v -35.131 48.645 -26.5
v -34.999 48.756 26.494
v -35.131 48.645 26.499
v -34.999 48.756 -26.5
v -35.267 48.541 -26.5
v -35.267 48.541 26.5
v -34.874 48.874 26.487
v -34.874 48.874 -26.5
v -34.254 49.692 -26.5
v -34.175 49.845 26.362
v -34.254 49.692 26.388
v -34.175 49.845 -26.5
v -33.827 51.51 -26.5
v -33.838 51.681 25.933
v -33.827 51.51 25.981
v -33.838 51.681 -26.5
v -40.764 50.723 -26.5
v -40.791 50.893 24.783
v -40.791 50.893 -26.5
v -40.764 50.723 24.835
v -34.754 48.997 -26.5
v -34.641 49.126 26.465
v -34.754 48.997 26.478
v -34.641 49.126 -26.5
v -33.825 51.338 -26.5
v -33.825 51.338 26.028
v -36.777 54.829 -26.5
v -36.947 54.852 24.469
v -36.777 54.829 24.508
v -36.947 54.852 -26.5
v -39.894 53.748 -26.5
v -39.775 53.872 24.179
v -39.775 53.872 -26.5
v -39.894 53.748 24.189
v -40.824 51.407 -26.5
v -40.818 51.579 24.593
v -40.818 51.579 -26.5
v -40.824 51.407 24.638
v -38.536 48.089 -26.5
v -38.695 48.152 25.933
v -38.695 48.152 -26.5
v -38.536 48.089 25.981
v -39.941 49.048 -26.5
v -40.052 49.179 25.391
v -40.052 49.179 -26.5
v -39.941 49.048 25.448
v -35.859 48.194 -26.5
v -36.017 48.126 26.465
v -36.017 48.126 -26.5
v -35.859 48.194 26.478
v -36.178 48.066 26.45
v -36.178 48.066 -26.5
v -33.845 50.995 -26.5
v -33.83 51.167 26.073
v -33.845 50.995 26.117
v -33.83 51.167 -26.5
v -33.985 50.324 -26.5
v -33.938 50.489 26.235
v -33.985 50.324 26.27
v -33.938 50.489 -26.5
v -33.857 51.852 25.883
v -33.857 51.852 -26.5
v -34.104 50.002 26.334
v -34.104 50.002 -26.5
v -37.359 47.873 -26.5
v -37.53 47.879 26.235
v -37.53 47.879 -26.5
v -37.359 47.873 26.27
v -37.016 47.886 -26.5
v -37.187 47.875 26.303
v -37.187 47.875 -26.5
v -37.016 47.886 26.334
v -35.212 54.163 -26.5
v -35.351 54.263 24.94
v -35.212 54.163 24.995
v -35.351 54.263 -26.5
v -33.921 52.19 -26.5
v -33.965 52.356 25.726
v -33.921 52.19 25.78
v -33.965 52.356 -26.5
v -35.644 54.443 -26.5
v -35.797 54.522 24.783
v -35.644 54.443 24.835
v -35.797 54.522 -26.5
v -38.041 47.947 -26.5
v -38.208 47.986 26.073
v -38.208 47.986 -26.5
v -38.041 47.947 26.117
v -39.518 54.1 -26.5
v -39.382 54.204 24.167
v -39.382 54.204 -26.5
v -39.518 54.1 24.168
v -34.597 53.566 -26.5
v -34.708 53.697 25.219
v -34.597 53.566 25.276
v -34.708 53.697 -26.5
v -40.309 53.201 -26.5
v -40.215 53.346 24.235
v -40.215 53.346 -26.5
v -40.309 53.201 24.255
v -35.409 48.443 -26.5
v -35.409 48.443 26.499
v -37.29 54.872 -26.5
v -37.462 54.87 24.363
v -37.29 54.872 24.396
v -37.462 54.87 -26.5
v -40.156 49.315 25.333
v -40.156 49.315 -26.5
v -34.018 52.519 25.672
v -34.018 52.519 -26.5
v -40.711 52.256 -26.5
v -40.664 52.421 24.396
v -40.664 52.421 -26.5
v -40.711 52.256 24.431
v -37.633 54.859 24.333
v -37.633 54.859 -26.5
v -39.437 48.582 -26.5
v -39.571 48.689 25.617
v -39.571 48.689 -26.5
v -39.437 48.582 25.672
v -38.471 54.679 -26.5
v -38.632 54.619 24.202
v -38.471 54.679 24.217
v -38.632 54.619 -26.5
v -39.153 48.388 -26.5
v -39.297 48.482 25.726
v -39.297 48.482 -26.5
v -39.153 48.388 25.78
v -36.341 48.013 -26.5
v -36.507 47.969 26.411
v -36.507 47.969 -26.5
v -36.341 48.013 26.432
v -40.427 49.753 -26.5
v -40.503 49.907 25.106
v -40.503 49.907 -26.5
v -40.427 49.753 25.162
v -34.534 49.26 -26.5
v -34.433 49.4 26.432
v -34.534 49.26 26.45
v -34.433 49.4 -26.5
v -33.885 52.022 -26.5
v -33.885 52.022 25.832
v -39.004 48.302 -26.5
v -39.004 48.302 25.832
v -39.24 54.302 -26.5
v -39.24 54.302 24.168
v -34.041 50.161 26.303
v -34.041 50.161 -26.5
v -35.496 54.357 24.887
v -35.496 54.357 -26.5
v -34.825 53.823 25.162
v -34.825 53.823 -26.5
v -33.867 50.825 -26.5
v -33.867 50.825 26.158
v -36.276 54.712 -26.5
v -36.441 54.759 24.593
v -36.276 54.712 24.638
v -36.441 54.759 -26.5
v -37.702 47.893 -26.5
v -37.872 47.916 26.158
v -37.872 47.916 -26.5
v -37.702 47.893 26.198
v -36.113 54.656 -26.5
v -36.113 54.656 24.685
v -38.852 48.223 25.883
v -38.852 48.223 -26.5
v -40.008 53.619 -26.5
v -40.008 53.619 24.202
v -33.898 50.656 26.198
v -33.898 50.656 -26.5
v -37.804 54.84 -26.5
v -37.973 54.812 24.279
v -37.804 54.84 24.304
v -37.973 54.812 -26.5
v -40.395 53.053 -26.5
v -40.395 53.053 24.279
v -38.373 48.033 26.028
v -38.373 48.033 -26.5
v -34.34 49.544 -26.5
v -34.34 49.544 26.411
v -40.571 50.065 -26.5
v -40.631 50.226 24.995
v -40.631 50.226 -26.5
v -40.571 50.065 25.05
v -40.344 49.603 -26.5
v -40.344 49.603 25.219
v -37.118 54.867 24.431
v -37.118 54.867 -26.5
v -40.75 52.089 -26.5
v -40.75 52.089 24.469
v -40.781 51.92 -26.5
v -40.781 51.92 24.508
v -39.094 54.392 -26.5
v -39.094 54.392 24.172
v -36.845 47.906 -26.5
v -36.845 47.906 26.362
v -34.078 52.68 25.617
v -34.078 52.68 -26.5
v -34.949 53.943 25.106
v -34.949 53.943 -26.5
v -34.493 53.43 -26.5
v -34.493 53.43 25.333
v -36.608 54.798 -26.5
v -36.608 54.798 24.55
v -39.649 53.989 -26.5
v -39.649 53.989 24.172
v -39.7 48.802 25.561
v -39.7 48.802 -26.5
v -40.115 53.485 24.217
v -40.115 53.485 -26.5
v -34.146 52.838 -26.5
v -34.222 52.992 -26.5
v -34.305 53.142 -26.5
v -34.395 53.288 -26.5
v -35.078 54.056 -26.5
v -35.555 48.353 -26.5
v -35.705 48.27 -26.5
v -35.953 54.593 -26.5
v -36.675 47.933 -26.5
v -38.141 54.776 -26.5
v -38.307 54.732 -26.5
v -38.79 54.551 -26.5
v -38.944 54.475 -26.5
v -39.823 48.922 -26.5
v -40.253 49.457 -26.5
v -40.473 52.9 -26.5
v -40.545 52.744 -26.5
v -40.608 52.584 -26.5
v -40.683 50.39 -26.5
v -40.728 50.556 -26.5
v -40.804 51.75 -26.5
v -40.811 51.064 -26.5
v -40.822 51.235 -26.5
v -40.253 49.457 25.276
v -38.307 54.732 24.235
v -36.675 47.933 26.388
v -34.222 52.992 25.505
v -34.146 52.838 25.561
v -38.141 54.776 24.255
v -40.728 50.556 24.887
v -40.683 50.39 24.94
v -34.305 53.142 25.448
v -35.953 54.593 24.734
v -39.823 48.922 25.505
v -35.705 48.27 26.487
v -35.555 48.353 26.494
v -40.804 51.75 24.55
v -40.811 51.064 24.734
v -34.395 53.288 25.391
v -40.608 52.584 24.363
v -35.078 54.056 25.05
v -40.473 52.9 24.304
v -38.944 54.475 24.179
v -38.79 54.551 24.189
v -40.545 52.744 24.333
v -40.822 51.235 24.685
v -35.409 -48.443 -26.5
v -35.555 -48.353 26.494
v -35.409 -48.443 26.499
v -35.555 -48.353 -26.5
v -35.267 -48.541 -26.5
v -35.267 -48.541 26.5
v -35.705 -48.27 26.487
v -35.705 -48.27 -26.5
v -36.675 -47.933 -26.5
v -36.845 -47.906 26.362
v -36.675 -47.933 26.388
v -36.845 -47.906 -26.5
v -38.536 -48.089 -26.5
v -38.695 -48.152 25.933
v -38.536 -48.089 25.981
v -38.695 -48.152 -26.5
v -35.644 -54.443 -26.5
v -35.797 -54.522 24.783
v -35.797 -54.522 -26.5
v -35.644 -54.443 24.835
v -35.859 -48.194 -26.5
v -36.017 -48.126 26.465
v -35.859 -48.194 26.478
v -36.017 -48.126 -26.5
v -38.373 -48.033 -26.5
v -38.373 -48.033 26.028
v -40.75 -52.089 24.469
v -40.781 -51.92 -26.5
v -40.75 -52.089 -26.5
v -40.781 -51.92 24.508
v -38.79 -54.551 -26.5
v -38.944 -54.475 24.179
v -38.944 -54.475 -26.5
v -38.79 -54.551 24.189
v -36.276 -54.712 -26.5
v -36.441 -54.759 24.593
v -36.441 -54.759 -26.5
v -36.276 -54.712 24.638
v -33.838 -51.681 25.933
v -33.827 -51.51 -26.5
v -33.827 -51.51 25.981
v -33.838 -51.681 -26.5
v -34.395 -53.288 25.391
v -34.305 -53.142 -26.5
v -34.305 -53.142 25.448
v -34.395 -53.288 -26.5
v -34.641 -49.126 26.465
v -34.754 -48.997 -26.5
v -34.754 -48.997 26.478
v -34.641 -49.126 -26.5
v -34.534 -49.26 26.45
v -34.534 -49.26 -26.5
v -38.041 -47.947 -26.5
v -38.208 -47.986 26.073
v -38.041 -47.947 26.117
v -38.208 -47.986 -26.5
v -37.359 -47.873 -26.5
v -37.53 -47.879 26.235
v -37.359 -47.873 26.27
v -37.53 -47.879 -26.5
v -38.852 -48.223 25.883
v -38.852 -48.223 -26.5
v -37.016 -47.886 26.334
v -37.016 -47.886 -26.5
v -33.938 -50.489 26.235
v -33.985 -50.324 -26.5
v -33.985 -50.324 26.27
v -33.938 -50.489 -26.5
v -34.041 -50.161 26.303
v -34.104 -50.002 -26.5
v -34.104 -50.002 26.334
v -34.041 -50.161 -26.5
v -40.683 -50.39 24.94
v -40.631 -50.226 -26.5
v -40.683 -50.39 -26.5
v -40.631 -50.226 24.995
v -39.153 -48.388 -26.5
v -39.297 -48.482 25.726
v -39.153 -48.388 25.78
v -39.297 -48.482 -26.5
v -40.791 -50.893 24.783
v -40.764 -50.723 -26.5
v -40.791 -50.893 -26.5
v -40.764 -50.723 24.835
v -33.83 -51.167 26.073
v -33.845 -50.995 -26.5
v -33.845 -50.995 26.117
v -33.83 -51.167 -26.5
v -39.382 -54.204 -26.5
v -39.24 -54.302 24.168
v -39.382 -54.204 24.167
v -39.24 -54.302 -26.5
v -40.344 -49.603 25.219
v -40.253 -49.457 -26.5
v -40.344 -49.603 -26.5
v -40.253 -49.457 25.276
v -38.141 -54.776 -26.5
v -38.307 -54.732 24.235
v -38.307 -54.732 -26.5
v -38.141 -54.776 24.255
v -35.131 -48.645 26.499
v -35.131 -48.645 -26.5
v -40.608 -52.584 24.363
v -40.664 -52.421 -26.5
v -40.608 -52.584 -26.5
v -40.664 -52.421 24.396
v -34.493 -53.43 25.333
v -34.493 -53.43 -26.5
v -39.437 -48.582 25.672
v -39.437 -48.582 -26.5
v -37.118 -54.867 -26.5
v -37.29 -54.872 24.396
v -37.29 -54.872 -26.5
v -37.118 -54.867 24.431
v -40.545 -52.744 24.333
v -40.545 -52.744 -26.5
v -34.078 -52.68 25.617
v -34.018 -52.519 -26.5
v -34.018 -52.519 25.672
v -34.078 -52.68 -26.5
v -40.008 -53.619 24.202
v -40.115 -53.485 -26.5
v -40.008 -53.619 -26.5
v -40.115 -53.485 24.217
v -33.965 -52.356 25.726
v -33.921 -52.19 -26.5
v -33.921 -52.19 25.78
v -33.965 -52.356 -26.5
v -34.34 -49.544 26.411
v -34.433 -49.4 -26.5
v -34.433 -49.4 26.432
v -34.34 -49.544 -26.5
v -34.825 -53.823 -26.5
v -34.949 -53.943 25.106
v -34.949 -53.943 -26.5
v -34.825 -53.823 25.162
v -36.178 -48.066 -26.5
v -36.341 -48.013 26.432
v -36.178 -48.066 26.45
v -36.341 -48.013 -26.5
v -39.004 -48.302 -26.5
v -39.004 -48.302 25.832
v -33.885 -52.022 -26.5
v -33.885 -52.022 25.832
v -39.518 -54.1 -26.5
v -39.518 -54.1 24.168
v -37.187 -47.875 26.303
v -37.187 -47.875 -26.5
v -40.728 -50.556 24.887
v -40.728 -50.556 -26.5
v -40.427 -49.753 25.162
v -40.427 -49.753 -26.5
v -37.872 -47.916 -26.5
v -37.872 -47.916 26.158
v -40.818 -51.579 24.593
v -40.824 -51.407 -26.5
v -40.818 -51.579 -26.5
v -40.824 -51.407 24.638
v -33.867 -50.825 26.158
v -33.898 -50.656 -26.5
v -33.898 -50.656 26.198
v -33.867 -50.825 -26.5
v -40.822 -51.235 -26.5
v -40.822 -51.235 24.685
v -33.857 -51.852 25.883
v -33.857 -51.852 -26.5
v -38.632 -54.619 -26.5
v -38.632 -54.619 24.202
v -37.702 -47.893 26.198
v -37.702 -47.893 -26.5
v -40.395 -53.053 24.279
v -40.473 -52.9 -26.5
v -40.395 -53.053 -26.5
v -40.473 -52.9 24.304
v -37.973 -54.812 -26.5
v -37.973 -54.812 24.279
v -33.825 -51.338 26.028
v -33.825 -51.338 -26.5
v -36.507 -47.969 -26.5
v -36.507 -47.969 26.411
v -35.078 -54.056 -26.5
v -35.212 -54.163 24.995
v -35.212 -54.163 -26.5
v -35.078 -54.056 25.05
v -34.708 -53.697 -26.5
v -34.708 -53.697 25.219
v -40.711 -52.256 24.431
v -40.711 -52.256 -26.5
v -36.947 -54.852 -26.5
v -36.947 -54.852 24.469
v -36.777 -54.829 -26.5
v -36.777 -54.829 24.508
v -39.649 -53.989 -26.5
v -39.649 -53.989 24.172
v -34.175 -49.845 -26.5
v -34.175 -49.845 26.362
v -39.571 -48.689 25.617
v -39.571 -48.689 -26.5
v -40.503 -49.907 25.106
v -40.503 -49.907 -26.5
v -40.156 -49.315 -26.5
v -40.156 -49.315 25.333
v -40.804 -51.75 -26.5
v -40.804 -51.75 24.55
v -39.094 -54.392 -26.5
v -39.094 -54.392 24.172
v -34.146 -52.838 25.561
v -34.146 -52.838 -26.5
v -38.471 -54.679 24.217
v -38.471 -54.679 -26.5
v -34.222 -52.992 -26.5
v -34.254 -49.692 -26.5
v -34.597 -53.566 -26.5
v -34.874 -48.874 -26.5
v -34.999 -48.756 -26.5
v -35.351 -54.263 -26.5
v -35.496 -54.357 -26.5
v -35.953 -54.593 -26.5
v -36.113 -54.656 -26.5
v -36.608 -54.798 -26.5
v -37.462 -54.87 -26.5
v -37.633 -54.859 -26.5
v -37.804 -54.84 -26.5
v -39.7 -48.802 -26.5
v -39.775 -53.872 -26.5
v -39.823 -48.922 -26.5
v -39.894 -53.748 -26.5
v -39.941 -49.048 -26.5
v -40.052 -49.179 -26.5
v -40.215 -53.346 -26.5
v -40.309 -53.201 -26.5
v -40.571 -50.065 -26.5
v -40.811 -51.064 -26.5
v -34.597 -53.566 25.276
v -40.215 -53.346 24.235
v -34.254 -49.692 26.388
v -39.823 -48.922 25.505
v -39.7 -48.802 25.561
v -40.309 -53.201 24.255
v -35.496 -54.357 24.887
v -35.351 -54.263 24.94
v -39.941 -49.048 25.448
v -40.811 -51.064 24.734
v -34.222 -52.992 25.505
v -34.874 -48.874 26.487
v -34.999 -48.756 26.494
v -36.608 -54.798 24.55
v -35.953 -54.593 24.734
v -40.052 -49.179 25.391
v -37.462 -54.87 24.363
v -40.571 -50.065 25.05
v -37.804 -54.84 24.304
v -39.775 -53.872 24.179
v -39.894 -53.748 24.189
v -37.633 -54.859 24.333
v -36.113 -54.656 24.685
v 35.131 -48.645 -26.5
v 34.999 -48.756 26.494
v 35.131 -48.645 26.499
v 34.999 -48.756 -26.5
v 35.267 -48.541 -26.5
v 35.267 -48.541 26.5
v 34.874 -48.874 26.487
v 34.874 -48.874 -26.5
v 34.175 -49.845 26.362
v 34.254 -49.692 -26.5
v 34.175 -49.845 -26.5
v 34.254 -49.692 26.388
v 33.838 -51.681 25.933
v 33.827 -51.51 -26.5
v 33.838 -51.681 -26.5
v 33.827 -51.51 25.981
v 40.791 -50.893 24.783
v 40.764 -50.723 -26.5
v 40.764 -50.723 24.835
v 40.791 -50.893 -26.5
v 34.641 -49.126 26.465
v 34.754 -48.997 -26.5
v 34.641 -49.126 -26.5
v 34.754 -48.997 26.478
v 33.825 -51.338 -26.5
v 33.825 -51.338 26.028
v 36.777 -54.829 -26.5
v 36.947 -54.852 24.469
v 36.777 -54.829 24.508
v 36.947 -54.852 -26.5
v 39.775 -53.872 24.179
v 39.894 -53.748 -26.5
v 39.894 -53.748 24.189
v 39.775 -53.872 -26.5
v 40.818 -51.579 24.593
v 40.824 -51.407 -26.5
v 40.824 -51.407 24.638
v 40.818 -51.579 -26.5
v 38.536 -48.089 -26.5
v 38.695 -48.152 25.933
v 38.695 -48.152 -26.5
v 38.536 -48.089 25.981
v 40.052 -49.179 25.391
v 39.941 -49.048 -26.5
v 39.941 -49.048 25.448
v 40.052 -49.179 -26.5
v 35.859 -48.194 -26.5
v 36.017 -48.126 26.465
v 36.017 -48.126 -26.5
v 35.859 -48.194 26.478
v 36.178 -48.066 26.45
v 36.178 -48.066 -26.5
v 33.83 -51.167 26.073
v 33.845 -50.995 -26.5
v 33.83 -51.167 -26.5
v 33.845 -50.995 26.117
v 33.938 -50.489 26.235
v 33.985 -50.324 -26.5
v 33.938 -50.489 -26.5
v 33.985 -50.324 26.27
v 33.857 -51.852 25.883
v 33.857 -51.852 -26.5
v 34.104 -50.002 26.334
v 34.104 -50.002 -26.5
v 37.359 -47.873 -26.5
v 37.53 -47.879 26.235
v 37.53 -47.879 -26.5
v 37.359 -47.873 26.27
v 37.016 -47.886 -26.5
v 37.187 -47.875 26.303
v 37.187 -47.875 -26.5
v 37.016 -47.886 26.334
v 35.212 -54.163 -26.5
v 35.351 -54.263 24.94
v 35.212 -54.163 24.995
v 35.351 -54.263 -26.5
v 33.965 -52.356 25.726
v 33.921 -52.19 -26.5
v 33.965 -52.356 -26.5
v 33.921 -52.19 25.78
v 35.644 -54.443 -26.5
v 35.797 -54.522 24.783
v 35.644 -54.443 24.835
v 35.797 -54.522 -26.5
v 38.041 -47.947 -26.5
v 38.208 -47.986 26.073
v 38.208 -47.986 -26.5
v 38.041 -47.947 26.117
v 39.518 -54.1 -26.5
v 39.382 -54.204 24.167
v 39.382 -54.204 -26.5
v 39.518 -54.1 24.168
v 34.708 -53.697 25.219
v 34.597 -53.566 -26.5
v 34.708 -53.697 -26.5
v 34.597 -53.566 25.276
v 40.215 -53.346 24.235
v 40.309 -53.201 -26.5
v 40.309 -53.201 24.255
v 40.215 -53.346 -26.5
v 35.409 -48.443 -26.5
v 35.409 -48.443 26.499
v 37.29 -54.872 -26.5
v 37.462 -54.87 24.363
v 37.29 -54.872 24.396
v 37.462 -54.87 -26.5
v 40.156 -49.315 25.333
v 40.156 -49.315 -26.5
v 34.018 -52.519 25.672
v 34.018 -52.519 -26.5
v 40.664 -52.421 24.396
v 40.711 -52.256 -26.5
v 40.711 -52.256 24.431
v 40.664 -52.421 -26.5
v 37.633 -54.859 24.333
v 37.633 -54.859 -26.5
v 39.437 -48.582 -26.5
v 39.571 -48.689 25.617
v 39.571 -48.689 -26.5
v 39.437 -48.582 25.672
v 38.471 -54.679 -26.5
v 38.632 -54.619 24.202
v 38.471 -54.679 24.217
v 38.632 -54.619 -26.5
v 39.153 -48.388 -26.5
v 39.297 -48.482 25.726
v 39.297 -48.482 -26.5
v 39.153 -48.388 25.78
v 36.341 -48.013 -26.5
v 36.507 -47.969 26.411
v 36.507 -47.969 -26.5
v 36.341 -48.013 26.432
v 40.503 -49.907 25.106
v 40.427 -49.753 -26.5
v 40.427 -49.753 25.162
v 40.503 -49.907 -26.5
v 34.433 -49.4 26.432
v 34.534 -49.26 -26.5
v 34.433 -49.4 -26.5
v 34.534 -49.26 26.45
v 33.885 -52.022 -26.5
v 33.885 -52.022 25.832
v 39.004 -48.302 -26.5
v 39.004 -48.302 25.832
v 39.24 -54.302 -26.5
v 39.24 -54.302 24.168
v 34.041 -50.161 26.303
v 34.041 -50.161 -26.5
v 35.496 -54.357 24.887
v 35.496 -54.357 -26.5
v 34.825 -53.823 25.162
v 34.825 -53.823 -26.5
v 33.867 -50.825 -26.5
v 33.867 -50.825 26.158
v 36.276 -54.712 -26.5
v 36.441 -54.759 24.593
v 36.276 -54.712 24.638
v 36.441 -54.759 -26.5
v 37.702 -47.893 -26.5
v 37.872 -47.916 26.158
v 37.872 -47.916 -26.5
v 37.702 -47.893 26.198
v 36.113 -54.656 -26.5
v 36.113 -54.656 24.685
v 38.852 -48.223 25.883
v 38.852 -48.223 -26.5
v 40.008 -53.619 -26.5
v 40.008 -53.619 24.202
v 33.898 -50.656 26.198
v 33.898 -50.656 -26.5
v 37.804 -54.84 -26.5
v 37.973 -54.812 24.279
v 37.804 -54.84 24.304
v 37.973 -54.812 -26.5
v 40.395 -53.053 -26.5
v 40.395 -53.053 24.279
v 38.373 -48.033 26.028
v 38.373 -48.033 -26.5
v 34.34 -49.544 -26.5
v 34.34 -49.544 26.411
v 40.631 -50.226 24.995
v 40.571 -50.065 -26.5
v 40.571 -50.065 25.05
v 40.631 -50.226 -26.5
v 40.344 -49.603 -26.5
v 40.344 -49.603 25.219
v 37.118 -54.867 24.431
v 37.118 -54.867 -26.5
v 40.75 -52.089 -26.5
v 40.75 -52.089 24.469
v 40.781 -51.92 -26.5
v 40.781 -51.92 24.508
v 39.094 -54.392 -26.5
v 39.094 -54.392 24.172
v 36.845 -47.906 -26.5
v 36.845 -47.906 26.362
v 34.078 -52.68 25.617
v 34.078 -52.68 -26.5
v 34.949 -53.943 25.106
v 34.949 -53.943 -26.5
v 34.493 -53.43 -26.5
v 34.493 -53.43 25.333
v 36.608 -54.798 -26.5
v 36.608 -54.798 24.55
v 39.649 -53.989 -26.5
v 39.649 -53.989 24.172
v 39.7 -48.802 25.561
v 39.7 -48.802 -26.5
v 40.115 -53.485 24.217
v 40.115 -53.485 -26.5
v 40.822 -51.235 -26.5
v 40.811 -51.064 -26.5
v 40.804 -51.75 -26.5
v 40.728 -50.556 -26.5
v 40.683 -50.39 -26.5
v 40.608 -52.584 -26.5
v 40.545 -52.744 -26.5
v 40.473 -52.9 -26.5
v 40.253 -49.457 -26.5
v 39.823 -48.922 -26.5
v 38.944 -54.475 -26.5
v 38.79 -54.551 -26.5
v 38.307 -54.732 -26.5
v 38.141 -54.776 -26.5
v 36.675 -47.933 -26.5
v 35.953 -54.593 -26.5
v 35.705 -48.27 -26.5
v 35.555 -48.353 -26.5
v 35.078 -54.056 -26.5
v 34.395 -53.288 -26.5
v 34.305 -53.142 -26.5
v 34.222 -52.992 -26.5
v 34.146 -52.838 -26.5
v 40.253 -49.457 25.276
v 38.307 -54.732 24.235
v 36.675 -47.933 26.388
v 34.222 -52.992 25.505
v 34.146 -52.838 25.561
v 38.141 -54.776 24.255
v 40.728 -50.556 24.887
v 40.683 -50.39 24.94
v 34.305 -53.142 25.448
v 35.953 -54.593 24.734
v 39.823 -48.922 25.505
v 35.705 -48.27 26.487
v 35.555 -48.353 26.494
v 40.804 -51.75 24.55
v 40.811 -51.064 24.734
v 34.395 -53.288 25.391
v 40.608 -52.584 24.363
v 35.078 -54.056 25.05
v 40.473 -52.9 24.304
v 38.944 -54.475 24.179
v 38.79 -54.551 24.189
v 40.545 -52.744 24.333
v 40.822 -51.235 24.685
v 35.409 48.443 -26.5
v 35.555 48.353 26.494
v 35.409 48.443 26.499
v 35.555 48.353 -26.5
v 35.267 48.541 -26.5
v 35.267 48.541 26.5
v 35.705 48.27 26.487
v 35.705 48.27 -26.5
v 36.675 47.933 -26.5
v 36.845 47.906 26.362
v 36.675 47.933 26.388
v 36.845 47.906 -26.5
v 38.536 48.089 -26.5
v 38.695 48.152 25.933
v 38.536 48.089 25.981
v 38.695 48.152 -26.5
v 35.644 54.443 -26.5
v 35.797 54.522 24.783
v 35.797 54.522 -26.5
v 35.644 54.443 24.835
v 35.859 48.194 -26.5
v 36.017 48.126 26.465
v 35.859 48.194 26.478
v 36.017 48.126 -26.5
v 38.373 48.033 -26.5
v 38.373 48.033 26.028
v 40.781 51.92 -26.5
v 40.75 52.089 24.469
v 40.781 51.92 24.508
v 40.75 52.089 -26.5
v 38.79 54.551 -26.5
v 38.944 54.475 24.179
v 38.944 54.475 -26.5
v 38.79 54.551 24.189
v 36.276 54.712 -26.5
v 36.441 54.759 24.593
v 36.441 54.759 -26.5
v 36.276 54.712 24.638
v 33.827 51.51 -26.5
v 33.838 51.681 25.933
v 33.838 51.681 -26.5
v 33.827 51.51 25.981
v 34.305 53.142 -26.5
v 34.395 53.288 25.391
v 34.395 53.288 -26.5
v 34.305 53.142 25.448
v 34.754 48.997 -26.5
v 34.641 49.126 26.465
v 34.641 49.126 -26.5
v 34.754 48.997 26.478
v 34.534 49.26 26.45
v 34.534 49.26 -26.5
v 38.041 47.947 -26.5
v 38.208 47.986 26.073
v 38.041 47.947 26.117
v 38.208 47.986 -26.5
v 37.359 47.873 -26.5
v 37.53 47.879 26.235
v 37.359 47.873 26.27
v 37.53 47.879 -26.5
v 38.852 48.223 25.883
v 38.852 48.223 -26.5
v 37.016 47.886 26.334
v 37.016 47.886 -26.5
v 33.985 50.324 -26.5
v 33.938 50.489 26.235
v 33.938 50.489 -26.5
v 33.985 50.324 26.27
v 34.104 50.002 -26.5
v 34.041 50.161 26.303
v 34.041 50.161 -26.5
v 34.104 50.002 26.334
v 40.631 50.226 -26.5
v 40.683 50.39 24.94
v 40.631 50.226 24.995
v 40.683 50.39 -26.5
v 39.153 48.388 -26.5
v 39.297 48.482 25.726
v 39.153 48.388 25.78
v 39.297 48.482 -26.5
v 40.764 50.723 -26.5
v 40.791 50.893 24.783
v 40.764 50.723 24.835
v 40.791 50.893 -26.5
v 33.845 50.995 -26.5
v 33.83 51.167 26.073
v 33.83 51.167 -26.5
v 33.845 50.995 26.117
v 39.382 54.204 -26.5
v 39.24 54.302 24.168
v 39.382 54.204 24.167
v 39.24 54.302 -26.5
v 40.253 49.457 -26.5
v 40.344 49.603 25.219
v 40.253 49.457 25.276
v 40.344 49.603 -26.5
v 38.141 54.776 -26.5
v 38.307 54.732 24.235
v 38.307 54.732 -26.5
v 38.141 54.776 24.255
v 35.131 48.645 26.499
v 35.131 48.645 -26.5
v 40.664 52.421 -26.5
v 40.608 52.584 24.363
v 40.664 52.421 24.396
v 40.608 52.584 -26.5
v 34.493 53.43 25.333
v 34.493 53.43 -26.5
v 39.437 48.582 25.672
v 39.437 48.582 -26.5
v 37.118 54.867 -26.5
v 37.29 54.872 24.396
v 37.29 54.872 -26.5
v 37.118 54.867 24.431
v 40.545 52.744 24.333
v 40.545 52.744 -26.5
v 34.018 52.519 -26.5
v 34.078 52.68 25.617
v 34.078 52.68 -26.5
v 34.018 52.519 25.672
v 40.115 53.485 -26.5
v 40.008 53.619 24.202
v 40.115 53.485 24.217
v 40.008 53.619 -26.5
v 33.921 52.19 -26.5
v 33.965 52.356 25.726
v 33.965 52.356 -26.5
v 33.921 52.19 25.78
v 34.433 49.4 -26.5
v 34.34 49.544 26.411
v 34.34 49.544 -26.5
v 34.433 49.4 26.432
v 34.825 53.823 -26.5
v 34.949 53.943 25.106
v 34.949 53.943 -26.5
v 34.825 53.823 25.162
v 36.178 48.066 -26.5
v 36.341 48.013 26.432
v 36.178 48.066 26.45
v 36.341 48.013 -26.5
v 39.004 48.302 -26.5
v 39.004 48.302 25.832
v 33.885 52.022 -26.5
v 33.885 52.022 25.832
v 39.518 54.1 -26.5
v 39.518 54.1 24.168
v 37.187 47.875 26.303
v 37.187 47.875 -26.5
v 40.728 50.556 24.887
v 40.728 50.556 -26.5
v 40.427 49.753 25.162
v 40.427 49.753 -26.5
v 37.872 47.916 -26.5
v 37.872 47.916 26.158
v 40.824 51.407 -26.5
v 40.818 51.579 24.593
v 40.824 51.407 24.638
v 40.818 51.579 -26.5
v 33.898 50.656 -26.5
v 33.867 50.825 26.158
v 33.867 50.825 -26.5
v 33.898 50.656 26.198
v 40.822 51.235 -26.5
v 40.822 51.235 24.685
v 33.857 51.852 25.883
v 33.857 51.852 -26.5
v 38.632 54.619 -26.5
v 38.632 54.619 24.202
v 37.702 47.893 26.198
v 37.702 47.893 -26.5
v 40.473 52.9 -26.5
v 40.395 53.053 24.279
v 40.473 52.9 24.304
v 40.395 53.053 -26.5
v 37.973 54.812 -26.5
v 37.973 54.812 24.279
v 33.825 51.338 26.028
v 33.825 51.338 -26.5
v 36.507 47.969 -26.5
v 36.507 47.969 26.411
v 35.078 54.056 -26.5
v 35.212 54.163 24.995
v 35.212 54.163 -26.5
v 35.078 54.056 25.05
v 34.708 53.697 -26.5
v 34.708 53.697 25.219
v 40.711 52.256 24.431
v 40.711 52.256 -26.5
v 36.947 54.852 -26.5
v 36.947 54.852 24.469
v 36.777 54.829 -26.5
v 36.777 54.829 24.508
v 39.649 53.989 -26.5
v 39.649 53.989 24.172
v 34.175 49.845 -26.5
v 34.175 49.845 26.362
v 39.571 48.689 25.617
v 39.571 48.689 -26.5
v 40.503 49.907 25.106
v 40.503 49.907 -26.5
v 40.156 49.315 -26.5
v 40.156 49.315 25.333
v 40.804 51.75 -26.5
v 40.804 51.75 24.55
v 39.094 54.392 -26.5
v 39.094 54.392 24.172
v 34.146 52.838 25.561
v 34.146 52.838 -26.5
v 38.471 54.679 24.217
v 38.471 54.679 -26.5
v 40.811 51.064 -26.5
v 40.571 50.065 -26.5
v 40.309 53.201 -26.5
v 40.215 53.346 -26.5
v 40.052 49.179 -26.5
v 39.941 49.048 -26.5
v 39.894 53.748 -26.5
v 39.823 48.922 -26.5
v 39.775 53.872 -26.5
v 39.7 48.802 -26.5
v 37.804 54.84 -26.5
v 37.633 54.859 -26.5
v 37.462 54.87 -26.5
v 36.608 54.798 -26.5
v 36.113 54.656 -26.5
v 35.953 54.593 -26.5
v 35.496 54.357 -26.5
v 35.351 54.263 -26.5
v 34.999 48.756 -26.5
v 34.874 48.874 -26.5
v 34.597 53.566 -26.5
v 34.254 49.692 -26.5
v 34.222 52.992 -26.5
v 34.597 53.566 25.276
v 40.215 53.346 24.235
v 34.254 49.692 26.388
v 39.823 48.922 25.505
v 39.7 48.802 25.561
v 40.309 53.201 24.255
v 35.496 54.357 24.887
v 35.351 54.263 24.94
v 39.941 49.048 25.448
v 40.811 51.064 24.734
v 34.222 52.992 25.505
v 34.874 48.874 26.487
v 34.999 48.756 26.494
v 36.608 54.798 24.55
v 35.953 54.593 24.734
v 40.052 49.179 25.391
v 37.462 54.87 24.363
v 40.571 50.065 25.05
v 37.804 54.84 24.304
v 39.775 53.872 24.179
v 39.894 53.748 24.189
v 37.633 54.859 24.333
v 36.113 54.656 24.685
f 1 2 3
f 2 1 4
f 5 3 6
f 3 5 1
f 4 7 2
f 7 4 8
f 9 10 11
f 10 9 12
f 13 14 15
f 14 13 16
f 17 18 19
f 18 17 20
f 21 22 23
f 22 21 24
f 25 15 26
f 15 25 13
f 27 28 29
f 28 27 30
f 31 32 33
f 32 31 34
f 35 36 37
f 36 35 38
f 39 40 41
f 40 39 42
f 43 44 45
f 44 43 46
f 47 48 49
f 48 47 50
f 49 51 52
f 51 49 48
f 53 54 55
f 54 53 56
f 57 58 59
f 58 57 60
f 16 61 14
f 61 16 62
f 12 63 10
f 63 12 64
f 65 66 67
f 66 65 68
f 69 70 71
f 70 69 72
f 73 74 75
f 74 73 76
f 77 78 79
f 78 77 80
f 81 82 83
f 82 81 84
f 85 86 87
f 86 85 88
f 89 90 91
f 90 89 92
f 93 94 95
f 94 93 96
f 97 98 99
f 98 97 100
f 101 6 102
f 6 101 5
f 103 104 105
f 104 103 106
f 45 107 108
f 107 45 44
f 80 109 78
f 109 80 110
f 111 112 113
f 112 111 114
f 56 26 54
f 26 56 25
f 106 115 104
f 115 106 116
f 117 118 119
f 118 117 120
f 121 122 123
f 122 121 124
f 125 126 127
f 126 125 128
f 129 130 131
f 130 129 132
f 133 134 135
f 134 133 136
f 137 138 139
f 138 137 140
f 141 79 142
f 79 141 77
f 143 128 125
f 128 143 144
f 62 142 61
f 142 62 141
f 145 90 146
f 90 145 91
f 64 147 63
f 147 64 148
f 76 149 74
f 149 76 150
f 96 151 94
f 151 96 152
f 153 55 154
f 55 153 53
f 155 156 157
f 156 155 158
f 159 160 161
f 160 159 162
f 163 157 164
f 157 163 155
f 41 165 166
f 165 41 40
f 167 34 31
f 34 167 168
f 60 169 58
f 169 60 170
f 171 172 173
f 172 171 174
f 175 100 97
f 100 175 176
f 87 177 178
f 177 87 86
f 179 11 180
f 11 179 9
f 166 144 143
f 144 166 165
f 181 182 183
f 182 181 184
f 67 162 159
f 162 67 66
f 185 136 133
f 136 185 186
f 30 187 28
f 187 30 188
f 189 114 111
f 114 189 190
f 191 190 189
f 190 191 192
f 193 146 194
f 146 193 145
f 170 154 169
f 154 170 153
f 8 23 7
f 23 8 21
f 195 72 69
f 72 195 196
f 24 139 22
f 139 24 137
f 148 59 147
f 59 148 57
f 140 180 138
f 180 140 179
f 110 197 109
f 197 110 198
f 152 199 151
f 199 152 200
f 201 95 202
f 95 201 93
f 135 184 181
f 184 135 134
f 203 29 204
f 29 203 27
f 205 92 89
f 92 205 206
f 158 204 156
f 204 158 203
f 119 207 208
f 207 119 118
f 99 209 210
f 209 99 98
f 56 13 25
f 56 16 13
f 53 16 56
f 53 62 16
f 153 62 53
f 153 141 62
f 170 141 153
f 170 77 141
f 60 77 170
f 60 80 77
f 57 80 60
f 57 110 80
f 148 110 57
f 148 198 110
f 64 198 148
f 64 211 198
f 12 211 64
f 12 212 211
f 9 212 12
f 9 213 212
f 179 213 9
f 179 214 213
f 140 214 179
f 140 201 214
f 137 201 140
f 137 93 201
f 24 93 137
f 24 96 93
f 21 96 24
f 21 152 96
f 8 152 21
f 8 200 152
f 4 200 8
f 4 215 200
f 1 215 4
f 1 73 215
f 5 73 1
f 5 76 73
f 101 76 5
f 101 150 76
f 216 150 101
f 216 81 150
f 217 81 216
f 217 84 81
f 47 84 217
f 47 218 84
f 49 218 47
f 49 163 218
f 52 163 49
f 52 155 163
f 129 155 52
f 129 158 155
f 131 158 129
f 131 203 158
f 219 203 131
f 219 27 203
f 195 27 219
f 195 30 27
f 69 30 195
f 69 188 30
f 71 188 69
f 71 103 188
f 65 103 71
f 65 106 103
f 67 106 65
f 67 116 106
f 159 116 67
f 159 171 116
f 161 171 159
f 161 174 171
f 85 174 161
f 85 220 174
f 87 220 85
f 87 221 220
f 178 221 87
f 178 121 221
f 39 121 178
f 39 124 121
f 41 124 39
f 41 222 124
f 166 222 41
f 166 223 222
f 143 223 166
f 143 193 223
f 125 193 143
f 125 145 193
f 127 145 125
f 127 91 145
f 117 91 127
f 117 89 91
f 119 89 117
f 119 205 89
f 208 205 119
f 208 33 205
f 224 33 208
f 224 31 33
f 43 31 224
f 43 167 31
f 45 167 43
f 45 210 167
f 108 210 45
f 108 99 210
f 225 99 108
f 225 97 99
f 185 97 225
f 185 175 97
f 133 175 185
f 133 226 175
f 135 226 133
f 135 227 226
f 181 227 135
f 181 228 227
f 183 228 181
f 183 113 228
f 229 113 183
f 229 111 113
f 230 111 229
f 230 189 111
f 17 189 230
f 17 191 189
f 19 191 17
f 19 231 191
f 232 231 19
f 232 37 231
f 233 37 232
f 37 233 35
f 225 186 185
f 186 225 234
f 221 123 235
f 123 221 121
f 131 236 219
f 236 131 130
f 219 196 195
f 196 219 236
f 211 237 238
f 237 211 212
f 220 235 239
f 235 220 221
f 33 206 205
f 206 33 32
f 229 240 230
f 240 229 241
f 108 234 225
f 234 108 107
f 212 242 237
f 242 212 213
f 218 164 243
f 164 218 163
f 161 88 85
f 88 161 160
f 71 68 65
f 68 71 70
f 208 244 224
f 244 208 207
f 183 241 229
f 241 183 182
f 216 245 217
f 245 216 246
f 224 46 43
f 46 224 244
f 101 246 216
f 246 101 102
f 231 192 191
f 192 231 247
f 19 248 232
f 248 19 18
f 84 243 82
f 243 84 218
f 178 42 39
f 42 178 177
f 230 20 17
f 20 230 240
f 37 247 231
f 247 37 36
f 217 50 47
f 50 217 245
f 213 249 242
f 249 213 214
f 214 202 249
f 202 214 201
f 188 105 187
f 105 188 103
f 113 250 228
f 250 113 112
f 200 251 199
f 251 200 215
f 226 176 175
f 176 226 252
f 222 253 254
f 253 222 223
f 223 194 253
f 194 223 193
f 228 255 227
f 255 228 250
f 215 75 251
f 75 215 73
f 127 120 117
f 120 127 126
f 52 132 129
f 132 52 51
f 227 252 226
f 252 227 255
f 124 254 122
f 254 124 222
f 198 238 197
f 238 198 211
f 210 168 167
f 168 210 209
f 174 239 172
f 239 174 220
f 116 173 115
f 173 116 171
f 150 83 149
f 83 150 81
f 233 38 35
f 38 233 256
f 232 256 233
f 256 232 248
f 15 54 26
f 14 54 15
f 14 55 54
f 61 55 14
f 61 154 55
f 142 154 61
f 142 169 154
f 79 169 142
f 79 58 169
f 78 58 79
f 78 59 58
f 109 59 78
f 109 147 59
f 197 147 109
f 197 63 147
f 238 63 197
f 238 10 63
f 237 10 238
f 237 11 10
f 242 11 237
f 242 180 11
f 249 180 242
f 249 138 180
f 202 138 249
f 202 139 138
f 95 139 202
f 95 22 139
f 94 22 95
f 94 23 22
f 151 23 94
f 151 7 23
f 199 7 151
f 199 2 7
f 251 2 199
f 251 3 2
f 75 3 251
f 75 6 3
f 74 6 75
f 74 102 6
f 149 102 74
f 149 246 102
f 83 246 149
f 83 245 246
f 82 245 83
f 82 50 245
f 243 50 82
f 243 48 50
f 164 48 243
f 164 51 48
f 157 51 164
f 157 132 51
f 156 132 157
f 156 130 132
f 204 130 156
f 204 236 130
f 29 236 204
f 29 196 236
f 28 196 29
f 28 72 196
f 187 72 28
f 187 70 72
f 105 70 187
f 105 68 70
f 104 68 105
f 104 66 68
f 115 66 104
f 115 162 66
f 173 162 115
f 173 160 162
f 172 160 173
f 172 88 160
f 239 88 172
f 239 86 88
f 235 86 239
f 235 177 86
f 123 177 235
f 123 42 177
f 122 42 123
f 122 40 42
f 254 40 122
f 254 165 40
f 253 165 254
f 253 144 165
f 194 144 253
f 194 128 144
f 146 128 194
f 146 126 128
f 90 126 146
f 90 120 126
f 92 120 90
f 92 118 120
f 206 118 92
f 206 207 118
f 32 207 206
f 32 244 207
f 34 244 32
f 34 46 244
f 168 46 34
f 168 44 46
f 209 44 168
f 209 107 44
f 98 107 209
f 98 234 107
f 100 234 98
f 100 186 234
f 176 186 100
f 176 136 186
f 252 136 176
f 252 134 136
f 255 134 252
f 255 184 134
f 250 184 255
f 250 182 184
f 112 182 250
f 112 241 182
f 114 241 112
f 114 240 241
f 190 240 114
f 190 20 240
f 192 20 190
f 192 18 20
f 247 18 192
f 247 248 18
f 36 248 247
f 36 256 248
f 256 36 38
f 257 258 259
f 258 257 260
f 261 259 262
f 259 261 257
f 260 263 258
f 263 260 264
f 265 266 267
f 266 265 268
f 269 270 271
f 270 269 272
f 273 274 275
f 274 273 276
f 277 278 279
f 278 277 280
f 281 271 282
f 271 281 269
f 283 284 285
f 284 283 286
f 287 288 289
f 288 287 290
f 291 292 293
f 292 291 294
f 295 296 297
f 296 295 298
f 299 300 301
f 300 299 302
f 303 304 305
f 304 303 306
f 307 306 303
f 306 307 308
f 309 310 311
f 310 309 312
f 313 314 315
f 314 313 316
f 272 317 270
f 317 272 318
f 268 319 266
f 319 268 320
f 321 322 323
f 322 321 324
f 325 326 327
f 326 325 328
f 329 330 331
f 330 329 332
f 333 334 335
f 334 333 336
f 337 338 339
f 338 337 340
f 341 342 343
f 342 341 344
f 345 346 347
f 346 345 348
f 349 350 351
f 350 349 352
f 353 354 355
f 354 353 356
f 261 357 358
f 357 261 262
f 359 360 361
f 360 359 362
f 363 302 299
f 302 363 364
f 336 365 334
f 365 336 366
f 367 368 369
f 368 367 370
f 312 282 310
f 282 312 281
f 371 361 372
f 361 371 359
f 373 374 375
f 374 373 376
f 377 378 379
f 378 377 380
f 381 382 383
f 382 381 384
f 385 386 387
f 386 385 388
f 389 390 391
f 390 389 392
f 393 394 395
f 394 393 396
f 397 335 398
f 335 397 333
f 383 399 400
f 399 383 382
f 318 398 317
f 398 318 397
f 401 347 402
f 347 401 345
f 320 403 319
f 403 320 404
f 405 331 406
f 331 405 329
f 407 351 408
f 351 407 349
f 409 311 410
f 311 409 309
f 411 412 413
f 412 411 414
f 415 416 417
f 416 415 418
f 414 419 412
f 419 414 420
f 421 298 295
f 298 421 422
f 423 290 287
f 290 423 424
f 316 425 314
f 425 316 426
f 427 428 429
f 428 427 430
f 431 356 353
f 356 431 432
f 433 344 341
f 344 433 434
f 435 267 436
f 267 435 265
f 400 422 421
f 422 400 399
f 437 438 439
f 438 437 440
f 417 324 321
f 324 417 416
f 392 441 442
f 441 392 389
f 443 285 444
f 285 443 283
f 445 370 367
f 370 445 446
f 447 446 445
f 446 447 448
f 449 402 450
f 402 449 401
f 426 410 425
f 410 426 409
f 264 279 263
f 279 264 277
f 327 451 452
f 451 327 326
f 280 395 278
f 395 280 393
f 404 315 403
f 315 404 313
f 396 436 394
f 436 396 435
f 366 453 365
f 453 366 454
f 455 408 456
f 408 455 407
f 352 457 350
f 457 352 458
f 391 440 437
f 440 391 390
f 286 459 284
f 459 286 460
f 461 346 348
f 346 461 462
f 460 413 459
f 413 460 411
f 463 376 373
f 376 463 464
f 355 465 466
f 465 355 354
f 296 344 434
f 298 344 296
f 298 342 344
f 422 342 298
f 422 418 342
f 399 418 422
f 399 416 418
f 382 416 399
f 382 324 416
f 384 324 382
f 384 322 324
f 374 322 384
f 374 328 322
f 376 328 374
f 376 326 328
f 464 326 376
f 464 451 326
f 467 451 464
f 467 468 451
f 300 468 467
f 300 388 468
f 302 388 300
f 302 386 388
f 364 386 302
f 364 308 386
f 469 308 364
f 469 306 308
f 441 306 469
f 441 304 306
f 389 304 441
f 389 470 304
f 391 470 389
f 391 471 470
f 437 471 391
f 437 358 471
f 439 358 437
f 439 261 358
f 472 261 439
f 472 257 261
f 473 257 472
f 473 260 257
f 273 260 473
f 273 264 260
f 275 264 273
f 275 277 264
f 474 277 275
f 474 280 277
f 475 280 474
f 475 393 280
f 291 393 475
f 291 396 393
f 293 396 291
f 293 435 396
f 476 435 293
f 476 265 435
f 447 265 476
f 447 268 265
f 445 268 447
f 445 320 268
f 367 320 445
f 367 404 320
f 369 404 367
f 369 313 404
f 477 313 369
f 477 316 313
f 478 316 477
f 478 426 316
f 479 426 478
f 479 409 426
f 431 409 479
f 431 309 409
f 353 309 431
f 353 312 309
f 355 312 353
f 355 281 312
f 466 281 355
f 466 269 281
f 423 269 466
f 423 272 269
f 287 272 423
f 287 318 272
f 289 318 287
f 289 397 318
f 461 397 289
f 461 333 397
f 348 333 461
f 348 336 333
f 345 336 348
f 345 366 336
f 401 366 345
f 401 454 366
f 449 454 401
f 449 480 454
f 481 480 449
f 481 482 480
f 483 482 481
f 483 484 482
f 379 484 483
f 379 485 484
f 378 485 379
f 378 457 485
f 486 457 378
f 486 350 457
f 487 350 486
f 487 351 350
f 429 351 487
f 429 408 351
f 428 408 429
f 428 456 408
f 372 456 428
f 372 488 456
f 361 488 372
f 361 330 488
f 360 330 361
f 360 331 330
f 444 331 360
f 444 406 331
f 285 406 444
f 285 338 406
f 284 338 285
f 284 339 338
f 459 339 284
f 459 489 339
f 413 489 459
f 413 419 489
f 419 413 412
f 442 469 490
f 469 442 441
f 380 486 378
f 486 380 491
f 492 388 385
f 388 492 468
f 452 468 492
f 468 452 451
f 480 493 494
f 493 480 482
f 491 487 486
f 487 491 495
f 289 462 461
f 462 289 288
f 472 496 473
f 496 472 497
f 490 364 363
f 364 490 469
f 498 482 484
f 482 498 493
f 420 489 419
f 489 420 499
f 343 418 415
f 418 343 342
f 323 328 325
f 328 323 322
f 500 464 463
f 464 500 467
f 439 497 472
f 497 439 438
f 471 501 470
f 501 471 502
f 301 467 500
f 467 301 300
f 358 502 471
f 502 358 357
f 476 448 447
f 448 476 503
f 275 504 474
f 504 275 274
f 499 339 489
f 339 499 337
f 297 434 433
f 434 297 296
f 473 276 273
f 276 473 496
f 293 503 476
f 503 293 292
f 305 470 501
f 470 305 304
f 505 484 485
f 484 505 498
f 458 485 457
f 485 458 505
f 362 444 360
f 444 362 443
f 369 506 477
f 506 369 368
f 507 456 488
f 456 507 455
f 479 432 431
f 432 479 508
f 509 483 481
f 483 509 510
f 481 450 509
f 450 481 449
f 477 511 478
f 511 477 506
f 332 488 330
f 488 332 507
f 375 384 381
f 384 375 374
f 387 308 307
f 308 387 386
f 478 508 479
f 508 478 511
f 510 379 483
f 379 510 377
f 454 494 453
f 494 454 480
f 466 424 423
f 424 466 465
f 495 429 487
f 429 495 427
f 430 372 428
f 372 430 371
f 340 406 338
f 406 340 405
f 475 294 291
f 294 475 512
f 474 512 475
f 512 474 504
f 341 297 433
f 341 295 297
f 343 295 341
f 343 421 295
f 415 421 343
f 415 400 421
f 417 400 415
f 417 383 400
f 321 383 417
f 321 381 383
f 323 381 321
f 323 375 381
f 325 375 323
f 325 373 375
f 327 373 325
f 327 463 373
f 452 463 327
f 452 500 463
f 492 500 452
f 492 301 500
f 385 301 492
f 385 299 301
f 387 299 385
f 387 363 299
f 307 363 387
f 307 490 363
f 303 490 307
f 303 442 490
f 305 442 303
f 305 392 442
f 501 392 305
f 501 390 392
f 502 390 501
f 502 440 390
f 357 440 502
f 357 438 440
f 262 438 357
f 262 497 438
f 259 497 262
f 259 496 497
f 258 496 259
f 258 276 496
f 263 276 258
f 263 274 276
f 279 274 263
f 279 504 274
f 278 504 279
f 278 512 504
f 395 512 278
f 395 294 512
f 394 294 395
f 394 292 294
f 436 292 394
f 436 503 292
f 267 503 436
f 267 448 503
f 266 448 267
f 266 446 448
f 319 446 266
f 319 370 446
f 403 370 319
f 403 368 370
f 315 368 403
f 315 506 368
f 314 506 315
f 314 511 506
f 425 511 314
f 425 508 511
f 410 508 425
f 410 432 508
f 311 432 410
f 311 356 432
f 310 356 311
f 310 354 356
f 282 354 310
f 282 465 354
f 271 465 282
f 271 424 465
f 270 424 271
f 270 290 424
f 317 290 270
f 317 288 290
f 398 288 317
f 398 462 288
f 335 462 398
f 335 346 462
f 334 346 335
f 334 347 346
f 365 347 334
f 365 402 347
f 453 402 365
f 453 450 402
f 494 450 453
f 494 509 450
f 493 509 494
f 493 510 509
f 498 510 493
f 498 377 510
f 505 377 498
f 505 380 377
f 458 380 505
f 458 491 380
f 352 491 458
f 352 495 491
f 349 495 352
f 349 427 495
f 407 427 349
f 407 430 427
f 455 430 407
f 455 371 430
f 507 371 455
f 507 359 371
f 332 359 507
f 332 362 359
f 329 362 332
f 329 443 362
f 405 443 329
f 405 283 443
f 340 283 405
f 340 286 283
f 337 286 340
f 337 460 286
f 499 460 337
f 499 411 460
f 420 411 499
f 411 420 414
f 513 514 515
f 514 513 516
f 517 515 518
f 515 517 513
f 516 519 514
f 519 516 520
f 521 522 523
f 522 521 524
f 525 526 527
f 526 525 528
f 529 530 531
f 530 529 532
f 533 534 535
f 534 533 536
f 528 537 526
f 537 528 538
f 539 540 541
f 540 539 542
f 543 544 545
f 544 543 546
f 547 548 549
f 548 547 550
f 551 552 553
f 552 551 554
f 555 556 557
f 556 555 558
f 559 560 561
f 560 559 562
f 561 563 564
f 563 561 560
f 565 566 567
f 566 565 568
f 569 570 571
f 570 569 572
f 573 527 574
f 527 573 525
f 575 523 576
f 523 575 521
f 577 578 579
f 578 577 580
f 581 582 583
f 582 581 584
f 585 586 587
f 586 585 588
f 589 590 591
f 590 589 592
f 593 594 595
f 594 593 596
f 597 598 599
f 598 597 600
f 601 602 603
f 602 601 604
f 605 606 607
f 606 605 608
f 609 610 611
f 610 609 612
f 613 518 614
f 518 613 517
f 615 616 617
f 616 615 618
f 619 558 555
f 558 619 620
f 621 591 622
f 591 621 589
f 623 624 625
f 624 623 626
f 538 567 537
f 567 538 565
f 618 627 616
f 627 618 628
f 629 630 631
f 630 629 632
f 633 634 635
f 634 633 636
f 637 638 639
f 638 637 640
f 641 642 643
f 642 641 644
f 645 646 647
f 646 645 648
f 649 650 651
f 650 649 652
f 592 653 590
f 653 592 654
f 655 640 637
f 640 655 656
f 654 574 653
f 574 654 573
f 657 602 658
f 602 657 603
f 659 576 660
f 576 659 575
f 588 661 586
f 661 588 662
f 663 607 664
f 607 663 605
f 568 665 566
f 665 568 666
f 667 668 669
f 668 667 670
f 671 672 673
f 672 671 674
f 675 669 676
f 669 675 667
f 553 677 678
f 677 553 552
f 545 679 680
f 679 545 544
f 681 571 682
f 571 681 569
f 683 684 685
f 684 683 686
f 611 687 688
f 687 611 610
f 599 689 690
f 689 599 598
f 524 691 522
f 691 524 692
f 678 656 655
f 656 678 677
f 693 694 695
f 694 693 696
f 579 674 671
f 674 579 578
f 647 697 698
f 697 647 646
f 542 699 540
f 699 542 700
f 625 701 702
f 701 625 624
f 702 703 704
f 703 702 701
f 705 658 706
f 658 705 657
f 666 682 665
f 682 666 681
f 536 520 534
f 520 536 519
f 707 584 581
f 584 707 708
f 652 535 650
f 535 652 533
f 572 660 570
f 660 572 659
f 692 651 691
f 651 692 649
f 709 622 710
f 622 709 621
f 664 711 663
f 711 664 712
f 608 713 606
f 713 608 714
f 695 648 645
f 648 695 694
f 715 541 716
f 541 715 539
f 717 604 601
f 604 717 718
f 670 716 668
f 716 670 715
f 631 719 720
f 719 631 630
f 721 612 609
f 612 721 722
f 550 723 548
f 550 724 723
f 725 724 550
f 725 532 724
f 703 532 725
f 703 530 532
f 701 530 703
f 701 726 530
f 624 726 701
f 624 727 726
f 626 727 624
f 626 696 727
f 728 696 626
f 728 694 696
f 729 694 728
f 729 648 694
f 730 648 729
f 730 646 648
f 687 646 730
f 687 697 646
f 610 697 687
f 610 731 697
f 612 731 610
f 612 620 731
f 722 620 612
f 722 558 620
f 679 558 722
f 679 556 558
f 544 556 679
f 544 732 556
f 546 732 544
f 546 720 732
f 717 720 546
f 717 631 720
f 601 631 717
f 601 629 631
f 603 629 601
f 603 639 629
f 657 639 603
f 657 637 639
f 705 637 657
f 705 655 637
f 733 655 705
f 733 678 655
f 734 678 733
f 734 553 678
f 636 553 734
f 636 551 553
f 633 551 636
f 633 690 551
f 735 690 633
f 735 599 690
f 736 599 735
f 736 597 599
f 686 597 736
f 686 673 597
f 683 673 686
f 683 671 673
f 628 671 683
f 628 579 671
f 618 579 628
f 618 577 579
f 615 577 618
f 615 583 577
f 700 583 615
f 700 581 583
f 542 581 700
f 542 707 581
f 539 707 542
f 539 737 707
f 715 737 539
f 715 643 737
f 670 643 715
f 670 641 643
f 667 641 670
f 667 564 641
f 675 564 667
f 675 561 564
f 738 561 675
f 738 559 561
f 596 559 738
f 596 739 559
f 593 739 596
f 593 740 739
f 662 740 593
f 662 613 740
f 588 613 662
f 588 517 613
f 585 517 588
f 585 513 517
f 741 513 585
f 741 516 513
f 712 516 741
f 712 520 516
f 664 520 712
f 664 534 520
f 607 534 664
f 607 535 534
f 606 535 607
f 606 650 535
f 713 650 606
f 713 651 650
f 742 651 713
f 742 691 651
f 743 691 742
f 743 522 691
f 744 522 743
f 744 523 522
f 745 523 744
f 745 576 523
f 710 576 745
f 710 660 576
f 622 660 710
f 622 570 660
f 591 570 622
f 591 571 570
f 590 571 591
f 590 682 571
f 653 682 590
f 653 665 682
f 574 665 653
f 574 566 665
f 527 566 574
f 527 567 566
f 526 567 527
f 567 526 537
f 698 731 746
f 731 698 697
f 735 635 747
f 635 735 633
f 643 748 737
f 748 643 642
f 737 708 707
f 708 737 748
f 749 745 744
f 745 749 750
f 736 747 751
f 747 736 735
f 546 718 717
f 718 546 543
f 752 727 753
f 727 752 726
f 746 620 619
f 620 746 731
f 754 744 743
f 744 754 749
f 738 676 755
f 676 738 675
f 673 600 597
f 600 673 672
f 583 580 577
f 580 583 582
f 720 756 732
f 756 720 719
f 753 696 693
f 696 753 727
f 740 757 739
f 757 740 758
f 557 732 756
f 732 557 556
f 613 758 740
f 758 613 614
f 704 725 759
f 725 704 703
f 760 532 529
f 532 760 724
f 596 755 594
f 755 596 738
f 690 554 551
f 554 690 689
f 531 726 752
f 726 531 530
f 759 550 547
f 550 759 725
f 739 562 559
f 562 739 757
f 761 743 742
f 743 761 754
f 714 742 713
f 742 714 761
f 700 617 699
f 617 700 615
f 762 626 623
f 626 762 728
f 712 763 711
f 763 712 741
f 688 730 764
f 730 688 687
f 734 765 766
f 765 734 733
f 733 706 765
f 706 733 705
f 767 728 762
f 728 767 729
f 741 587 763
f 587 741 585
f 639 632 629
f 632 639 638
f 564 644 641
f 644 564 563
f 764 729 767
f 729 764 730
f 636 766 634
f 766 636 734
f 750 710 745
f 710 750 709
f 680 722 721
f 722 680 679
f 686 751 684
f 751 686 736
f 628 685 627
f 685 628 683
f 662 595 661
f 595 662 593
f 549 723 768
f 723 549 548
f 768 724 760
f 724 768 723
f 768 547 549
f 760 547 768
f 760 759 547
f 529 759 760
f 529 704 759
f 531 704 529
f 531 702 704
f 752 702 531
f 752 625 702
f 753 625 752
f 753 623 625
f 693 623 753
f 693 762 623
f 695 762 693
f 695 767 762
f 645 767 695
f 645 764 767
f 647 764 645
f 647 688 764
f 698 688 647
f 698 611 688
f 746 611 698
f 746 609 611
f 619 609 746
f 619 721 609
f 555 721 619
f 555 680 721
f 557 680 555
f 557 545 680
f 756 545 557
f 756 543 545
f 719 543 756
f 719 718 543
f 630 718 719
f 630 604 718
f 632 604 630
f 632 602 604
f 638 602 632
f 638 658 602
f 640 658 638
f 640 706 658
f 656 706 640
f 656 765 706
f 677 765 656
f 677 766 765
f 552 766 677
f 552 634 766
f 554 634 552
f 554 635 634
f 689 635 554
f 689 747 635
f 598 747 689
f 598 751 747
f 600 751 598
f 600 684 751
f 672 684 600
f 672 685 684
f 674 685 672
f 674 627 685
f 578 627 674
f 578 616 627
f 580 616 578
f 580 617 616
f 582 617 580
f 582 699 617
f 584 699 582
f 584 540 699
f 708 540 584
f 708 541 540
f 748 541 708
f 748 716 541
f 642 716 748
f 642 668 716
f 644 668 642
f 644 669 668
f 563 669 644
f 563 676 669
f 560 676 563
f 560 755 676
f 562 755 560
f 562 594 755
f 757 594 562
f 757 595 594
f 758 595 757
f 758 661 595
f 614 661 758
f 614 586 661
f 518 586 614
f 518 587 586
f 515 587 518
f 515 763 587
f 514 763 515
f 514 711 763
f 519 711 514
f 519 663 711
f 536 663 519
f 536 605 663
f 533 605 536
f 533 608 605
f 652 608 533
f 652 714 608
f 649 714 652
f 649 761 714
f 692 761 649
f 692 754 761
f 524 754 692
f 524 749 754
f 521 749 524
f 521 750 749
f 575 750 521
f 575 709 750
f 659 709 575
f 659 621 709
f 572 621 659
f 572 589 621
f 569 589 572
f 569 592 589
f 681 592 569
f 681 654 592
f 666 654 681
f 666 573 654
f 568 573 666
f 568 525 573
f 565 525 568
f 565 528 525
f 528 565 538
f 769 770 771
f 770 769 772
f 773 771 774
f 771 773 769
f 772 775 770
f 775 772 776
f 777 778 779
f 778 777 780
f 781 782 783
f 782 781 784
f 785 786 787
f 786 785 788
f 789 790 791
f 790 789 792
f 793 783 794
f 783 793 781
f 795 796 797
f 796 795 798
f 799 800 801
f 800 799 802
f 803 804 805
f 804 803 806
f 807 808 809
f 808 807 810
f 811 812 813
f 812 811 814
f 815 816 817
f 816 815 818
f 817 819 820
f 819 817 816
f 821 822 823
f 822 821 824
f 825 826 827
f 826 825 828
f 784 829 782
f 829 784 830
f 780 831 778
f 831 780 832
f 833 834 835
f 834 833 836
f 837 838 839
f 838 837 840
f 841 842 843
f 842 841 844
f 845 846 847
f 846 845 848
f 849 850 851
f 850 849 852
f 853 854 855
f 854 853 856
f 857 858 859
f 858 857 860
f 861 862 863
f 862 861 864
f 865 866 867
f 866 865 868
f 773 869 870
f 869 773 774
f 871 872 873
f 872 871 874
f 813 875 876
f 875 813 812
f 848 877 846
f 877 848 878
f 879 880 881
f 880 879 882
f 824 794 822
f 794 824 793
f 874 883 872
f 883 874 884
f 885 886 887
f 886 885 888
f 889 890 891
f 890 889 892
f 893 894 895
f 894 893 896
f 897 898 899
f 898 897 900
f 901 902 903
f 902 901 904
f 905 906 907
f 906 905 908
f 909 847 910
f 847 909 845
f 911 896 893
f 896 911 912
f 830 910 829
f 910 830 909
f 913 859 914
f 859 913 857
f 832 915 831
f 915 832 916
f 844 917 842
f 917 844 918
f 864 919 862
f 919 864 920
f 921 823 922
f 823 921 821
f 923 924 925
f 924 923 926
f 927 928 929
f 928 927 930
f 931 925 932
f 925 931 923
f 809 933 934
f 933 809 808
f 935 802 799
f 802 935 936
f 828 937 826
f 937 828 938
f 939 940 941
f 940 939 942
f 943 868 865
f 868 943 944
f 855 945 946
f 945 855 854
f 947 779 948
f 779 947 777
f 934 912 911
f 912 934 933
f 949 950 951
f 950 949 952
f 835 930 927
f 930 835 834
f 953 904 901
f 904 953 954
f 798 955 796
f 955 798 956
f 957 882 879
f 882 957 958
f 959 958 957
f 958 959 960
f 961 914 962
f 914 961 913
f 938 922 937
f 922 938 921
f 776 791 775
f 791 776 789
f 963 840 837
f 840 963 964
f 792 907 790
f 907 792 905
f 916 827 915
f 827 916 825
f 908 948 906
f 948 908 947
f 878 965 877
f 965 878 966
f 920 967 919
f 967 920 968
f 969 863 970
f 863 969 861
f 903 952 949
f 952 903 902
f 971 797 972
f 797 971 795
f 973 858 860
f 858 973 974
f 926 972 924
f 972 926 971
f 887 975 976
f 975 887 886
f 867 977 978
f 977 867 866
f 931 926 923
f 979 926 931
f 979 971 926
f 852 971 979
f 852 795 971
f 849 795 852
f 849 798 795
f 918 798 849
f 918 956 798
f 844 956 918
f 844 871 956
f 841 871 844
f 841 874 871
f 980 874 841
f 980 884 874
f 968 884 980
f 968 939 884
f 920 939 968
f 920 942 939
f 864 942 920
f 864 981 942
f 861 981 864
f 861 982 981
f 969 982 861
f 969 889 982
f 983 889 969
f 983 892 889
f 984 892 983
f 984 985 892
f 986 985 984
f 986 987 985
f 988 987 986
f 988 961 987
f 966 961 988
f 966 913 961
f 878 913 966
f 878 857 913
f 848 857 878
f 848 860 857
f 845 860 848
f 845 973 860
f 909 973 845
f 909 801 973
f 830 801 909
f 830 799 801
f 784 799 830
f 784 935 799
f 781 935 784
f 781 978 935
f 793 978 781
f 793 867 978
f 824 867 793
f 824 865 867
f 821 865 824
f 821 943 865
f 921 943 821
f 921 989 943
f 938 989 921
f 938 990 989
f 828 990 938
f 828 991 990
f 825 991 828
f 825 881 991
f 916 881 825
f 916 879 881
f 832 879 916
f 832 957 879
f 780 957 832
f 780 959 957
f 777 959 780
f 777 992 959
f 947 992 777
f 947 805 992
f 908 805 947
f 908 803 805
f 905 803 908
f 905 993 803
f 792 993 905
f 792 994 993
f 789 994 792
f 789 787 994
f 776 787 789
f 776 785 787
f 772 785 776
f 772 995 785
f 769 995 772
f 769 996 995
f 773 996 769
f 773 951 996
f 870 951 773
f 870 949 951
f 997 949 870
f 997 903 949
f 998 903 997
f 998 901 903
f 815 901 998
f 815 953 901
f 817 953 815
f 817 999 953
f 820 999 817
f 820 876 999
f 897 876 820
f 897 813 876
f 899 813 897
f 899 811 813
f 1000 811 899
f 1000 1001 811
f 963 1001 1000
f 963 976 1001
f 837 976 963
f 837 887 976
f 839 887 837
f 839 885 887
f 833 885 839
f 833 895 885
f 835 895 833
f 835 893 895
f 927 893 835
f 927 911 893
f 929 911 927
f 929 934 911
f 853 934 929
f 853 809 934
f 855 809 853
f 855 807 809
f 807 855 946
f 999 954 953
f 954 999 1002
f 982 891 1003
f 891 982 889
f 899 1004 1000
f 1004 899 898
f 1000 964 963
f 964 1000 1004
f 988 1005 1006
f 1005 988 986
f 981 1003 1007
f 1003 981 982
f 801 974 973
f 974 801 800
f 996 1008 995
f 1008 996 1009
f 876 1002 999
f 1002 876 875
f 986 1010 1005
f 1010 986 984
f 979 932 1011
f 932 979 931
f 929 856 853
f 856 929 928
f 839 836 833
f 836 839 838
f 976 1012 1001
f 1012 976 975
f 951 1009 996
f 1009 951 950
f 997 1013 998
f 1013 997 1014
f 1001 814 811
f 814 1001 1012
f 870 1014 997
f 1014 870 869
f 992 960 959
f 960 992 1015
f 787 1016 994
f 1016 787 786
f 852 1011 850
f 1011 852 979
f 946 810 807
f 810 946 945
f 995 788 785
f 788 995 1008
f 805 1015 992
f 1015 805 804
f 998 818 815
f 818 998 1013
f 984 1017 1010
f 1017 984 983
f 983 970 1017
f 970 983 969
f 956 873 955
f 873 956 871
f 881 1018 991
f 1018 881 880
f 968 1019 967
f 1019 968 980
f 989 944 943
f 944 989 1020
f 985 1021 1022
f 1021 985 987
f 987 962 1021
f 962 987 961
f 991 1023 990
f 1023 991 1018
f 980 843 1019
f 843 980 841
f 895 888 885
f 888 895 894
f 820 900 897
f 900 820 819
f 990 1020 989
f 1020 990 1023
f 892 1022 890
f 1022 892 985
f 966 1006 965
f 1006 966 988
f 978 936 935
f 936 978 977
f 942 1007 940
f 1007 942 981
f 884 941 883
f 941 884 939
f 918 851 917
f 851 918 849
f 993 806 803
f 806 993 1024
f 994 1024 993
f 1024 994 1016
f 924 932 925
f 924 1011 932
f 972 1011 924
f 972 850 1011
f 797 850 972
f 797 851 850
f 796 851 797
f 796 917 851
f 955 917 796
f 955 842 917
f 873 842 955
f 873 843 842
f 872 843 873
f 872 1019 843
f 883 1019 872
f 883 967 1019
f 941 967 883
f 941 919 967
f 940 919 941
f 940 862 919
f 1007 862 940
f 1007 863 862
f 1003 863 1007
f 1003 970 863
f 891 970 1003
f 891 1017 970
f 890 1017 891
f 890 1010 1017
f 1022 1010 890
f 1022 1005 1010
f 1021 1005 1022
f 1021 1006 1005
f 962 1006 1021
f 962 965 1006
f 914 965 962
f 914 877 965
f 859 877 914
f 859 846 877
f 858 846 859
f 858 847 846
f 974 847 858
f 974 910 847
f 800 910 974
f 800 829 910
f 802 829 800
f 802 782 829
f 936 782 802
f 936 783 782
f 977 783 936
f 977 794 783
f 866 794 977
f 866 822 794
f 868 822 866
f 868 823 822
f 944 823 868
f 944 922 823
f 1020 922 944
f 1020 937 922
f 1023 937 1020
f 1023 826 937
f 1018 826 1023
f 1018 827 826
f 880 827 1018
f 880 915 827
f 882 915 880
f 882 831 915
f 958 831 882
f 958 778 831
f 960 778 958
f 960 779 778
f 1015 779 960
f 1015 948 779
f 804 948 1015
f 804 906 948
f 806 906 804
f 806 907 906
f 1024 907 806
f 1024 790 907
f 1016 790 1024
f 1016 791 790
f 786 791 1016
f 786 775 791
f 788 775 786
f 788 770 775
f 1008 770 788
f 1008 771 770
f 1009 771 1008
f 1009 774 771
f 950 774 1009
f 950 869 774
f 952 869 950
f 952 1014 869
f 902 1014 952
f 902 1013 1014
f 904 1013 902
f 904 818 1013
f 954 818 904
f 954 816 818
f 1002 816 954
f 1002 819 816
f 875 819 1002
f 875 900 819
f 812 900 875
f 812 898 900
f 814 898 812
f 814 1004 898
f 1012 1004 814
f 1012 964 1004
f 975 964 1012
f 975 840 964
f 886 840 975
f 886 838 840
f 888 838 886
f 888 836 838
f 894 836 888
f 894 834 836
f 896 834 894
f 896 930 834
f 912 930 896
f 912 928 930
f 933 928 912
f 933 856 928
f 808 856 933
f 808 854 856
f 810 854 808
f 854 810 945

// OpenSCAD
$fn = 128;


    	for (i = [36,144,216,324]) {
    		rotate([0, 0, i]) 
    			translate([0,127/2,0])
    				cover_leg();   				
    		}

module cover_leg() {
	rotate([0,0,270])
	difference() {
		cylinder(d=7,h=53,center=true);
		translate([-30+3.5,0,53/2])
			rotate(a=[-90,0,0])
				linear_extrude(height = 10, center = true, convexity = 10, twist = 0)
					polygon(points=[[0,0],[30,0],[0,10]], paths=[[0,1,2]]);
	}
}
